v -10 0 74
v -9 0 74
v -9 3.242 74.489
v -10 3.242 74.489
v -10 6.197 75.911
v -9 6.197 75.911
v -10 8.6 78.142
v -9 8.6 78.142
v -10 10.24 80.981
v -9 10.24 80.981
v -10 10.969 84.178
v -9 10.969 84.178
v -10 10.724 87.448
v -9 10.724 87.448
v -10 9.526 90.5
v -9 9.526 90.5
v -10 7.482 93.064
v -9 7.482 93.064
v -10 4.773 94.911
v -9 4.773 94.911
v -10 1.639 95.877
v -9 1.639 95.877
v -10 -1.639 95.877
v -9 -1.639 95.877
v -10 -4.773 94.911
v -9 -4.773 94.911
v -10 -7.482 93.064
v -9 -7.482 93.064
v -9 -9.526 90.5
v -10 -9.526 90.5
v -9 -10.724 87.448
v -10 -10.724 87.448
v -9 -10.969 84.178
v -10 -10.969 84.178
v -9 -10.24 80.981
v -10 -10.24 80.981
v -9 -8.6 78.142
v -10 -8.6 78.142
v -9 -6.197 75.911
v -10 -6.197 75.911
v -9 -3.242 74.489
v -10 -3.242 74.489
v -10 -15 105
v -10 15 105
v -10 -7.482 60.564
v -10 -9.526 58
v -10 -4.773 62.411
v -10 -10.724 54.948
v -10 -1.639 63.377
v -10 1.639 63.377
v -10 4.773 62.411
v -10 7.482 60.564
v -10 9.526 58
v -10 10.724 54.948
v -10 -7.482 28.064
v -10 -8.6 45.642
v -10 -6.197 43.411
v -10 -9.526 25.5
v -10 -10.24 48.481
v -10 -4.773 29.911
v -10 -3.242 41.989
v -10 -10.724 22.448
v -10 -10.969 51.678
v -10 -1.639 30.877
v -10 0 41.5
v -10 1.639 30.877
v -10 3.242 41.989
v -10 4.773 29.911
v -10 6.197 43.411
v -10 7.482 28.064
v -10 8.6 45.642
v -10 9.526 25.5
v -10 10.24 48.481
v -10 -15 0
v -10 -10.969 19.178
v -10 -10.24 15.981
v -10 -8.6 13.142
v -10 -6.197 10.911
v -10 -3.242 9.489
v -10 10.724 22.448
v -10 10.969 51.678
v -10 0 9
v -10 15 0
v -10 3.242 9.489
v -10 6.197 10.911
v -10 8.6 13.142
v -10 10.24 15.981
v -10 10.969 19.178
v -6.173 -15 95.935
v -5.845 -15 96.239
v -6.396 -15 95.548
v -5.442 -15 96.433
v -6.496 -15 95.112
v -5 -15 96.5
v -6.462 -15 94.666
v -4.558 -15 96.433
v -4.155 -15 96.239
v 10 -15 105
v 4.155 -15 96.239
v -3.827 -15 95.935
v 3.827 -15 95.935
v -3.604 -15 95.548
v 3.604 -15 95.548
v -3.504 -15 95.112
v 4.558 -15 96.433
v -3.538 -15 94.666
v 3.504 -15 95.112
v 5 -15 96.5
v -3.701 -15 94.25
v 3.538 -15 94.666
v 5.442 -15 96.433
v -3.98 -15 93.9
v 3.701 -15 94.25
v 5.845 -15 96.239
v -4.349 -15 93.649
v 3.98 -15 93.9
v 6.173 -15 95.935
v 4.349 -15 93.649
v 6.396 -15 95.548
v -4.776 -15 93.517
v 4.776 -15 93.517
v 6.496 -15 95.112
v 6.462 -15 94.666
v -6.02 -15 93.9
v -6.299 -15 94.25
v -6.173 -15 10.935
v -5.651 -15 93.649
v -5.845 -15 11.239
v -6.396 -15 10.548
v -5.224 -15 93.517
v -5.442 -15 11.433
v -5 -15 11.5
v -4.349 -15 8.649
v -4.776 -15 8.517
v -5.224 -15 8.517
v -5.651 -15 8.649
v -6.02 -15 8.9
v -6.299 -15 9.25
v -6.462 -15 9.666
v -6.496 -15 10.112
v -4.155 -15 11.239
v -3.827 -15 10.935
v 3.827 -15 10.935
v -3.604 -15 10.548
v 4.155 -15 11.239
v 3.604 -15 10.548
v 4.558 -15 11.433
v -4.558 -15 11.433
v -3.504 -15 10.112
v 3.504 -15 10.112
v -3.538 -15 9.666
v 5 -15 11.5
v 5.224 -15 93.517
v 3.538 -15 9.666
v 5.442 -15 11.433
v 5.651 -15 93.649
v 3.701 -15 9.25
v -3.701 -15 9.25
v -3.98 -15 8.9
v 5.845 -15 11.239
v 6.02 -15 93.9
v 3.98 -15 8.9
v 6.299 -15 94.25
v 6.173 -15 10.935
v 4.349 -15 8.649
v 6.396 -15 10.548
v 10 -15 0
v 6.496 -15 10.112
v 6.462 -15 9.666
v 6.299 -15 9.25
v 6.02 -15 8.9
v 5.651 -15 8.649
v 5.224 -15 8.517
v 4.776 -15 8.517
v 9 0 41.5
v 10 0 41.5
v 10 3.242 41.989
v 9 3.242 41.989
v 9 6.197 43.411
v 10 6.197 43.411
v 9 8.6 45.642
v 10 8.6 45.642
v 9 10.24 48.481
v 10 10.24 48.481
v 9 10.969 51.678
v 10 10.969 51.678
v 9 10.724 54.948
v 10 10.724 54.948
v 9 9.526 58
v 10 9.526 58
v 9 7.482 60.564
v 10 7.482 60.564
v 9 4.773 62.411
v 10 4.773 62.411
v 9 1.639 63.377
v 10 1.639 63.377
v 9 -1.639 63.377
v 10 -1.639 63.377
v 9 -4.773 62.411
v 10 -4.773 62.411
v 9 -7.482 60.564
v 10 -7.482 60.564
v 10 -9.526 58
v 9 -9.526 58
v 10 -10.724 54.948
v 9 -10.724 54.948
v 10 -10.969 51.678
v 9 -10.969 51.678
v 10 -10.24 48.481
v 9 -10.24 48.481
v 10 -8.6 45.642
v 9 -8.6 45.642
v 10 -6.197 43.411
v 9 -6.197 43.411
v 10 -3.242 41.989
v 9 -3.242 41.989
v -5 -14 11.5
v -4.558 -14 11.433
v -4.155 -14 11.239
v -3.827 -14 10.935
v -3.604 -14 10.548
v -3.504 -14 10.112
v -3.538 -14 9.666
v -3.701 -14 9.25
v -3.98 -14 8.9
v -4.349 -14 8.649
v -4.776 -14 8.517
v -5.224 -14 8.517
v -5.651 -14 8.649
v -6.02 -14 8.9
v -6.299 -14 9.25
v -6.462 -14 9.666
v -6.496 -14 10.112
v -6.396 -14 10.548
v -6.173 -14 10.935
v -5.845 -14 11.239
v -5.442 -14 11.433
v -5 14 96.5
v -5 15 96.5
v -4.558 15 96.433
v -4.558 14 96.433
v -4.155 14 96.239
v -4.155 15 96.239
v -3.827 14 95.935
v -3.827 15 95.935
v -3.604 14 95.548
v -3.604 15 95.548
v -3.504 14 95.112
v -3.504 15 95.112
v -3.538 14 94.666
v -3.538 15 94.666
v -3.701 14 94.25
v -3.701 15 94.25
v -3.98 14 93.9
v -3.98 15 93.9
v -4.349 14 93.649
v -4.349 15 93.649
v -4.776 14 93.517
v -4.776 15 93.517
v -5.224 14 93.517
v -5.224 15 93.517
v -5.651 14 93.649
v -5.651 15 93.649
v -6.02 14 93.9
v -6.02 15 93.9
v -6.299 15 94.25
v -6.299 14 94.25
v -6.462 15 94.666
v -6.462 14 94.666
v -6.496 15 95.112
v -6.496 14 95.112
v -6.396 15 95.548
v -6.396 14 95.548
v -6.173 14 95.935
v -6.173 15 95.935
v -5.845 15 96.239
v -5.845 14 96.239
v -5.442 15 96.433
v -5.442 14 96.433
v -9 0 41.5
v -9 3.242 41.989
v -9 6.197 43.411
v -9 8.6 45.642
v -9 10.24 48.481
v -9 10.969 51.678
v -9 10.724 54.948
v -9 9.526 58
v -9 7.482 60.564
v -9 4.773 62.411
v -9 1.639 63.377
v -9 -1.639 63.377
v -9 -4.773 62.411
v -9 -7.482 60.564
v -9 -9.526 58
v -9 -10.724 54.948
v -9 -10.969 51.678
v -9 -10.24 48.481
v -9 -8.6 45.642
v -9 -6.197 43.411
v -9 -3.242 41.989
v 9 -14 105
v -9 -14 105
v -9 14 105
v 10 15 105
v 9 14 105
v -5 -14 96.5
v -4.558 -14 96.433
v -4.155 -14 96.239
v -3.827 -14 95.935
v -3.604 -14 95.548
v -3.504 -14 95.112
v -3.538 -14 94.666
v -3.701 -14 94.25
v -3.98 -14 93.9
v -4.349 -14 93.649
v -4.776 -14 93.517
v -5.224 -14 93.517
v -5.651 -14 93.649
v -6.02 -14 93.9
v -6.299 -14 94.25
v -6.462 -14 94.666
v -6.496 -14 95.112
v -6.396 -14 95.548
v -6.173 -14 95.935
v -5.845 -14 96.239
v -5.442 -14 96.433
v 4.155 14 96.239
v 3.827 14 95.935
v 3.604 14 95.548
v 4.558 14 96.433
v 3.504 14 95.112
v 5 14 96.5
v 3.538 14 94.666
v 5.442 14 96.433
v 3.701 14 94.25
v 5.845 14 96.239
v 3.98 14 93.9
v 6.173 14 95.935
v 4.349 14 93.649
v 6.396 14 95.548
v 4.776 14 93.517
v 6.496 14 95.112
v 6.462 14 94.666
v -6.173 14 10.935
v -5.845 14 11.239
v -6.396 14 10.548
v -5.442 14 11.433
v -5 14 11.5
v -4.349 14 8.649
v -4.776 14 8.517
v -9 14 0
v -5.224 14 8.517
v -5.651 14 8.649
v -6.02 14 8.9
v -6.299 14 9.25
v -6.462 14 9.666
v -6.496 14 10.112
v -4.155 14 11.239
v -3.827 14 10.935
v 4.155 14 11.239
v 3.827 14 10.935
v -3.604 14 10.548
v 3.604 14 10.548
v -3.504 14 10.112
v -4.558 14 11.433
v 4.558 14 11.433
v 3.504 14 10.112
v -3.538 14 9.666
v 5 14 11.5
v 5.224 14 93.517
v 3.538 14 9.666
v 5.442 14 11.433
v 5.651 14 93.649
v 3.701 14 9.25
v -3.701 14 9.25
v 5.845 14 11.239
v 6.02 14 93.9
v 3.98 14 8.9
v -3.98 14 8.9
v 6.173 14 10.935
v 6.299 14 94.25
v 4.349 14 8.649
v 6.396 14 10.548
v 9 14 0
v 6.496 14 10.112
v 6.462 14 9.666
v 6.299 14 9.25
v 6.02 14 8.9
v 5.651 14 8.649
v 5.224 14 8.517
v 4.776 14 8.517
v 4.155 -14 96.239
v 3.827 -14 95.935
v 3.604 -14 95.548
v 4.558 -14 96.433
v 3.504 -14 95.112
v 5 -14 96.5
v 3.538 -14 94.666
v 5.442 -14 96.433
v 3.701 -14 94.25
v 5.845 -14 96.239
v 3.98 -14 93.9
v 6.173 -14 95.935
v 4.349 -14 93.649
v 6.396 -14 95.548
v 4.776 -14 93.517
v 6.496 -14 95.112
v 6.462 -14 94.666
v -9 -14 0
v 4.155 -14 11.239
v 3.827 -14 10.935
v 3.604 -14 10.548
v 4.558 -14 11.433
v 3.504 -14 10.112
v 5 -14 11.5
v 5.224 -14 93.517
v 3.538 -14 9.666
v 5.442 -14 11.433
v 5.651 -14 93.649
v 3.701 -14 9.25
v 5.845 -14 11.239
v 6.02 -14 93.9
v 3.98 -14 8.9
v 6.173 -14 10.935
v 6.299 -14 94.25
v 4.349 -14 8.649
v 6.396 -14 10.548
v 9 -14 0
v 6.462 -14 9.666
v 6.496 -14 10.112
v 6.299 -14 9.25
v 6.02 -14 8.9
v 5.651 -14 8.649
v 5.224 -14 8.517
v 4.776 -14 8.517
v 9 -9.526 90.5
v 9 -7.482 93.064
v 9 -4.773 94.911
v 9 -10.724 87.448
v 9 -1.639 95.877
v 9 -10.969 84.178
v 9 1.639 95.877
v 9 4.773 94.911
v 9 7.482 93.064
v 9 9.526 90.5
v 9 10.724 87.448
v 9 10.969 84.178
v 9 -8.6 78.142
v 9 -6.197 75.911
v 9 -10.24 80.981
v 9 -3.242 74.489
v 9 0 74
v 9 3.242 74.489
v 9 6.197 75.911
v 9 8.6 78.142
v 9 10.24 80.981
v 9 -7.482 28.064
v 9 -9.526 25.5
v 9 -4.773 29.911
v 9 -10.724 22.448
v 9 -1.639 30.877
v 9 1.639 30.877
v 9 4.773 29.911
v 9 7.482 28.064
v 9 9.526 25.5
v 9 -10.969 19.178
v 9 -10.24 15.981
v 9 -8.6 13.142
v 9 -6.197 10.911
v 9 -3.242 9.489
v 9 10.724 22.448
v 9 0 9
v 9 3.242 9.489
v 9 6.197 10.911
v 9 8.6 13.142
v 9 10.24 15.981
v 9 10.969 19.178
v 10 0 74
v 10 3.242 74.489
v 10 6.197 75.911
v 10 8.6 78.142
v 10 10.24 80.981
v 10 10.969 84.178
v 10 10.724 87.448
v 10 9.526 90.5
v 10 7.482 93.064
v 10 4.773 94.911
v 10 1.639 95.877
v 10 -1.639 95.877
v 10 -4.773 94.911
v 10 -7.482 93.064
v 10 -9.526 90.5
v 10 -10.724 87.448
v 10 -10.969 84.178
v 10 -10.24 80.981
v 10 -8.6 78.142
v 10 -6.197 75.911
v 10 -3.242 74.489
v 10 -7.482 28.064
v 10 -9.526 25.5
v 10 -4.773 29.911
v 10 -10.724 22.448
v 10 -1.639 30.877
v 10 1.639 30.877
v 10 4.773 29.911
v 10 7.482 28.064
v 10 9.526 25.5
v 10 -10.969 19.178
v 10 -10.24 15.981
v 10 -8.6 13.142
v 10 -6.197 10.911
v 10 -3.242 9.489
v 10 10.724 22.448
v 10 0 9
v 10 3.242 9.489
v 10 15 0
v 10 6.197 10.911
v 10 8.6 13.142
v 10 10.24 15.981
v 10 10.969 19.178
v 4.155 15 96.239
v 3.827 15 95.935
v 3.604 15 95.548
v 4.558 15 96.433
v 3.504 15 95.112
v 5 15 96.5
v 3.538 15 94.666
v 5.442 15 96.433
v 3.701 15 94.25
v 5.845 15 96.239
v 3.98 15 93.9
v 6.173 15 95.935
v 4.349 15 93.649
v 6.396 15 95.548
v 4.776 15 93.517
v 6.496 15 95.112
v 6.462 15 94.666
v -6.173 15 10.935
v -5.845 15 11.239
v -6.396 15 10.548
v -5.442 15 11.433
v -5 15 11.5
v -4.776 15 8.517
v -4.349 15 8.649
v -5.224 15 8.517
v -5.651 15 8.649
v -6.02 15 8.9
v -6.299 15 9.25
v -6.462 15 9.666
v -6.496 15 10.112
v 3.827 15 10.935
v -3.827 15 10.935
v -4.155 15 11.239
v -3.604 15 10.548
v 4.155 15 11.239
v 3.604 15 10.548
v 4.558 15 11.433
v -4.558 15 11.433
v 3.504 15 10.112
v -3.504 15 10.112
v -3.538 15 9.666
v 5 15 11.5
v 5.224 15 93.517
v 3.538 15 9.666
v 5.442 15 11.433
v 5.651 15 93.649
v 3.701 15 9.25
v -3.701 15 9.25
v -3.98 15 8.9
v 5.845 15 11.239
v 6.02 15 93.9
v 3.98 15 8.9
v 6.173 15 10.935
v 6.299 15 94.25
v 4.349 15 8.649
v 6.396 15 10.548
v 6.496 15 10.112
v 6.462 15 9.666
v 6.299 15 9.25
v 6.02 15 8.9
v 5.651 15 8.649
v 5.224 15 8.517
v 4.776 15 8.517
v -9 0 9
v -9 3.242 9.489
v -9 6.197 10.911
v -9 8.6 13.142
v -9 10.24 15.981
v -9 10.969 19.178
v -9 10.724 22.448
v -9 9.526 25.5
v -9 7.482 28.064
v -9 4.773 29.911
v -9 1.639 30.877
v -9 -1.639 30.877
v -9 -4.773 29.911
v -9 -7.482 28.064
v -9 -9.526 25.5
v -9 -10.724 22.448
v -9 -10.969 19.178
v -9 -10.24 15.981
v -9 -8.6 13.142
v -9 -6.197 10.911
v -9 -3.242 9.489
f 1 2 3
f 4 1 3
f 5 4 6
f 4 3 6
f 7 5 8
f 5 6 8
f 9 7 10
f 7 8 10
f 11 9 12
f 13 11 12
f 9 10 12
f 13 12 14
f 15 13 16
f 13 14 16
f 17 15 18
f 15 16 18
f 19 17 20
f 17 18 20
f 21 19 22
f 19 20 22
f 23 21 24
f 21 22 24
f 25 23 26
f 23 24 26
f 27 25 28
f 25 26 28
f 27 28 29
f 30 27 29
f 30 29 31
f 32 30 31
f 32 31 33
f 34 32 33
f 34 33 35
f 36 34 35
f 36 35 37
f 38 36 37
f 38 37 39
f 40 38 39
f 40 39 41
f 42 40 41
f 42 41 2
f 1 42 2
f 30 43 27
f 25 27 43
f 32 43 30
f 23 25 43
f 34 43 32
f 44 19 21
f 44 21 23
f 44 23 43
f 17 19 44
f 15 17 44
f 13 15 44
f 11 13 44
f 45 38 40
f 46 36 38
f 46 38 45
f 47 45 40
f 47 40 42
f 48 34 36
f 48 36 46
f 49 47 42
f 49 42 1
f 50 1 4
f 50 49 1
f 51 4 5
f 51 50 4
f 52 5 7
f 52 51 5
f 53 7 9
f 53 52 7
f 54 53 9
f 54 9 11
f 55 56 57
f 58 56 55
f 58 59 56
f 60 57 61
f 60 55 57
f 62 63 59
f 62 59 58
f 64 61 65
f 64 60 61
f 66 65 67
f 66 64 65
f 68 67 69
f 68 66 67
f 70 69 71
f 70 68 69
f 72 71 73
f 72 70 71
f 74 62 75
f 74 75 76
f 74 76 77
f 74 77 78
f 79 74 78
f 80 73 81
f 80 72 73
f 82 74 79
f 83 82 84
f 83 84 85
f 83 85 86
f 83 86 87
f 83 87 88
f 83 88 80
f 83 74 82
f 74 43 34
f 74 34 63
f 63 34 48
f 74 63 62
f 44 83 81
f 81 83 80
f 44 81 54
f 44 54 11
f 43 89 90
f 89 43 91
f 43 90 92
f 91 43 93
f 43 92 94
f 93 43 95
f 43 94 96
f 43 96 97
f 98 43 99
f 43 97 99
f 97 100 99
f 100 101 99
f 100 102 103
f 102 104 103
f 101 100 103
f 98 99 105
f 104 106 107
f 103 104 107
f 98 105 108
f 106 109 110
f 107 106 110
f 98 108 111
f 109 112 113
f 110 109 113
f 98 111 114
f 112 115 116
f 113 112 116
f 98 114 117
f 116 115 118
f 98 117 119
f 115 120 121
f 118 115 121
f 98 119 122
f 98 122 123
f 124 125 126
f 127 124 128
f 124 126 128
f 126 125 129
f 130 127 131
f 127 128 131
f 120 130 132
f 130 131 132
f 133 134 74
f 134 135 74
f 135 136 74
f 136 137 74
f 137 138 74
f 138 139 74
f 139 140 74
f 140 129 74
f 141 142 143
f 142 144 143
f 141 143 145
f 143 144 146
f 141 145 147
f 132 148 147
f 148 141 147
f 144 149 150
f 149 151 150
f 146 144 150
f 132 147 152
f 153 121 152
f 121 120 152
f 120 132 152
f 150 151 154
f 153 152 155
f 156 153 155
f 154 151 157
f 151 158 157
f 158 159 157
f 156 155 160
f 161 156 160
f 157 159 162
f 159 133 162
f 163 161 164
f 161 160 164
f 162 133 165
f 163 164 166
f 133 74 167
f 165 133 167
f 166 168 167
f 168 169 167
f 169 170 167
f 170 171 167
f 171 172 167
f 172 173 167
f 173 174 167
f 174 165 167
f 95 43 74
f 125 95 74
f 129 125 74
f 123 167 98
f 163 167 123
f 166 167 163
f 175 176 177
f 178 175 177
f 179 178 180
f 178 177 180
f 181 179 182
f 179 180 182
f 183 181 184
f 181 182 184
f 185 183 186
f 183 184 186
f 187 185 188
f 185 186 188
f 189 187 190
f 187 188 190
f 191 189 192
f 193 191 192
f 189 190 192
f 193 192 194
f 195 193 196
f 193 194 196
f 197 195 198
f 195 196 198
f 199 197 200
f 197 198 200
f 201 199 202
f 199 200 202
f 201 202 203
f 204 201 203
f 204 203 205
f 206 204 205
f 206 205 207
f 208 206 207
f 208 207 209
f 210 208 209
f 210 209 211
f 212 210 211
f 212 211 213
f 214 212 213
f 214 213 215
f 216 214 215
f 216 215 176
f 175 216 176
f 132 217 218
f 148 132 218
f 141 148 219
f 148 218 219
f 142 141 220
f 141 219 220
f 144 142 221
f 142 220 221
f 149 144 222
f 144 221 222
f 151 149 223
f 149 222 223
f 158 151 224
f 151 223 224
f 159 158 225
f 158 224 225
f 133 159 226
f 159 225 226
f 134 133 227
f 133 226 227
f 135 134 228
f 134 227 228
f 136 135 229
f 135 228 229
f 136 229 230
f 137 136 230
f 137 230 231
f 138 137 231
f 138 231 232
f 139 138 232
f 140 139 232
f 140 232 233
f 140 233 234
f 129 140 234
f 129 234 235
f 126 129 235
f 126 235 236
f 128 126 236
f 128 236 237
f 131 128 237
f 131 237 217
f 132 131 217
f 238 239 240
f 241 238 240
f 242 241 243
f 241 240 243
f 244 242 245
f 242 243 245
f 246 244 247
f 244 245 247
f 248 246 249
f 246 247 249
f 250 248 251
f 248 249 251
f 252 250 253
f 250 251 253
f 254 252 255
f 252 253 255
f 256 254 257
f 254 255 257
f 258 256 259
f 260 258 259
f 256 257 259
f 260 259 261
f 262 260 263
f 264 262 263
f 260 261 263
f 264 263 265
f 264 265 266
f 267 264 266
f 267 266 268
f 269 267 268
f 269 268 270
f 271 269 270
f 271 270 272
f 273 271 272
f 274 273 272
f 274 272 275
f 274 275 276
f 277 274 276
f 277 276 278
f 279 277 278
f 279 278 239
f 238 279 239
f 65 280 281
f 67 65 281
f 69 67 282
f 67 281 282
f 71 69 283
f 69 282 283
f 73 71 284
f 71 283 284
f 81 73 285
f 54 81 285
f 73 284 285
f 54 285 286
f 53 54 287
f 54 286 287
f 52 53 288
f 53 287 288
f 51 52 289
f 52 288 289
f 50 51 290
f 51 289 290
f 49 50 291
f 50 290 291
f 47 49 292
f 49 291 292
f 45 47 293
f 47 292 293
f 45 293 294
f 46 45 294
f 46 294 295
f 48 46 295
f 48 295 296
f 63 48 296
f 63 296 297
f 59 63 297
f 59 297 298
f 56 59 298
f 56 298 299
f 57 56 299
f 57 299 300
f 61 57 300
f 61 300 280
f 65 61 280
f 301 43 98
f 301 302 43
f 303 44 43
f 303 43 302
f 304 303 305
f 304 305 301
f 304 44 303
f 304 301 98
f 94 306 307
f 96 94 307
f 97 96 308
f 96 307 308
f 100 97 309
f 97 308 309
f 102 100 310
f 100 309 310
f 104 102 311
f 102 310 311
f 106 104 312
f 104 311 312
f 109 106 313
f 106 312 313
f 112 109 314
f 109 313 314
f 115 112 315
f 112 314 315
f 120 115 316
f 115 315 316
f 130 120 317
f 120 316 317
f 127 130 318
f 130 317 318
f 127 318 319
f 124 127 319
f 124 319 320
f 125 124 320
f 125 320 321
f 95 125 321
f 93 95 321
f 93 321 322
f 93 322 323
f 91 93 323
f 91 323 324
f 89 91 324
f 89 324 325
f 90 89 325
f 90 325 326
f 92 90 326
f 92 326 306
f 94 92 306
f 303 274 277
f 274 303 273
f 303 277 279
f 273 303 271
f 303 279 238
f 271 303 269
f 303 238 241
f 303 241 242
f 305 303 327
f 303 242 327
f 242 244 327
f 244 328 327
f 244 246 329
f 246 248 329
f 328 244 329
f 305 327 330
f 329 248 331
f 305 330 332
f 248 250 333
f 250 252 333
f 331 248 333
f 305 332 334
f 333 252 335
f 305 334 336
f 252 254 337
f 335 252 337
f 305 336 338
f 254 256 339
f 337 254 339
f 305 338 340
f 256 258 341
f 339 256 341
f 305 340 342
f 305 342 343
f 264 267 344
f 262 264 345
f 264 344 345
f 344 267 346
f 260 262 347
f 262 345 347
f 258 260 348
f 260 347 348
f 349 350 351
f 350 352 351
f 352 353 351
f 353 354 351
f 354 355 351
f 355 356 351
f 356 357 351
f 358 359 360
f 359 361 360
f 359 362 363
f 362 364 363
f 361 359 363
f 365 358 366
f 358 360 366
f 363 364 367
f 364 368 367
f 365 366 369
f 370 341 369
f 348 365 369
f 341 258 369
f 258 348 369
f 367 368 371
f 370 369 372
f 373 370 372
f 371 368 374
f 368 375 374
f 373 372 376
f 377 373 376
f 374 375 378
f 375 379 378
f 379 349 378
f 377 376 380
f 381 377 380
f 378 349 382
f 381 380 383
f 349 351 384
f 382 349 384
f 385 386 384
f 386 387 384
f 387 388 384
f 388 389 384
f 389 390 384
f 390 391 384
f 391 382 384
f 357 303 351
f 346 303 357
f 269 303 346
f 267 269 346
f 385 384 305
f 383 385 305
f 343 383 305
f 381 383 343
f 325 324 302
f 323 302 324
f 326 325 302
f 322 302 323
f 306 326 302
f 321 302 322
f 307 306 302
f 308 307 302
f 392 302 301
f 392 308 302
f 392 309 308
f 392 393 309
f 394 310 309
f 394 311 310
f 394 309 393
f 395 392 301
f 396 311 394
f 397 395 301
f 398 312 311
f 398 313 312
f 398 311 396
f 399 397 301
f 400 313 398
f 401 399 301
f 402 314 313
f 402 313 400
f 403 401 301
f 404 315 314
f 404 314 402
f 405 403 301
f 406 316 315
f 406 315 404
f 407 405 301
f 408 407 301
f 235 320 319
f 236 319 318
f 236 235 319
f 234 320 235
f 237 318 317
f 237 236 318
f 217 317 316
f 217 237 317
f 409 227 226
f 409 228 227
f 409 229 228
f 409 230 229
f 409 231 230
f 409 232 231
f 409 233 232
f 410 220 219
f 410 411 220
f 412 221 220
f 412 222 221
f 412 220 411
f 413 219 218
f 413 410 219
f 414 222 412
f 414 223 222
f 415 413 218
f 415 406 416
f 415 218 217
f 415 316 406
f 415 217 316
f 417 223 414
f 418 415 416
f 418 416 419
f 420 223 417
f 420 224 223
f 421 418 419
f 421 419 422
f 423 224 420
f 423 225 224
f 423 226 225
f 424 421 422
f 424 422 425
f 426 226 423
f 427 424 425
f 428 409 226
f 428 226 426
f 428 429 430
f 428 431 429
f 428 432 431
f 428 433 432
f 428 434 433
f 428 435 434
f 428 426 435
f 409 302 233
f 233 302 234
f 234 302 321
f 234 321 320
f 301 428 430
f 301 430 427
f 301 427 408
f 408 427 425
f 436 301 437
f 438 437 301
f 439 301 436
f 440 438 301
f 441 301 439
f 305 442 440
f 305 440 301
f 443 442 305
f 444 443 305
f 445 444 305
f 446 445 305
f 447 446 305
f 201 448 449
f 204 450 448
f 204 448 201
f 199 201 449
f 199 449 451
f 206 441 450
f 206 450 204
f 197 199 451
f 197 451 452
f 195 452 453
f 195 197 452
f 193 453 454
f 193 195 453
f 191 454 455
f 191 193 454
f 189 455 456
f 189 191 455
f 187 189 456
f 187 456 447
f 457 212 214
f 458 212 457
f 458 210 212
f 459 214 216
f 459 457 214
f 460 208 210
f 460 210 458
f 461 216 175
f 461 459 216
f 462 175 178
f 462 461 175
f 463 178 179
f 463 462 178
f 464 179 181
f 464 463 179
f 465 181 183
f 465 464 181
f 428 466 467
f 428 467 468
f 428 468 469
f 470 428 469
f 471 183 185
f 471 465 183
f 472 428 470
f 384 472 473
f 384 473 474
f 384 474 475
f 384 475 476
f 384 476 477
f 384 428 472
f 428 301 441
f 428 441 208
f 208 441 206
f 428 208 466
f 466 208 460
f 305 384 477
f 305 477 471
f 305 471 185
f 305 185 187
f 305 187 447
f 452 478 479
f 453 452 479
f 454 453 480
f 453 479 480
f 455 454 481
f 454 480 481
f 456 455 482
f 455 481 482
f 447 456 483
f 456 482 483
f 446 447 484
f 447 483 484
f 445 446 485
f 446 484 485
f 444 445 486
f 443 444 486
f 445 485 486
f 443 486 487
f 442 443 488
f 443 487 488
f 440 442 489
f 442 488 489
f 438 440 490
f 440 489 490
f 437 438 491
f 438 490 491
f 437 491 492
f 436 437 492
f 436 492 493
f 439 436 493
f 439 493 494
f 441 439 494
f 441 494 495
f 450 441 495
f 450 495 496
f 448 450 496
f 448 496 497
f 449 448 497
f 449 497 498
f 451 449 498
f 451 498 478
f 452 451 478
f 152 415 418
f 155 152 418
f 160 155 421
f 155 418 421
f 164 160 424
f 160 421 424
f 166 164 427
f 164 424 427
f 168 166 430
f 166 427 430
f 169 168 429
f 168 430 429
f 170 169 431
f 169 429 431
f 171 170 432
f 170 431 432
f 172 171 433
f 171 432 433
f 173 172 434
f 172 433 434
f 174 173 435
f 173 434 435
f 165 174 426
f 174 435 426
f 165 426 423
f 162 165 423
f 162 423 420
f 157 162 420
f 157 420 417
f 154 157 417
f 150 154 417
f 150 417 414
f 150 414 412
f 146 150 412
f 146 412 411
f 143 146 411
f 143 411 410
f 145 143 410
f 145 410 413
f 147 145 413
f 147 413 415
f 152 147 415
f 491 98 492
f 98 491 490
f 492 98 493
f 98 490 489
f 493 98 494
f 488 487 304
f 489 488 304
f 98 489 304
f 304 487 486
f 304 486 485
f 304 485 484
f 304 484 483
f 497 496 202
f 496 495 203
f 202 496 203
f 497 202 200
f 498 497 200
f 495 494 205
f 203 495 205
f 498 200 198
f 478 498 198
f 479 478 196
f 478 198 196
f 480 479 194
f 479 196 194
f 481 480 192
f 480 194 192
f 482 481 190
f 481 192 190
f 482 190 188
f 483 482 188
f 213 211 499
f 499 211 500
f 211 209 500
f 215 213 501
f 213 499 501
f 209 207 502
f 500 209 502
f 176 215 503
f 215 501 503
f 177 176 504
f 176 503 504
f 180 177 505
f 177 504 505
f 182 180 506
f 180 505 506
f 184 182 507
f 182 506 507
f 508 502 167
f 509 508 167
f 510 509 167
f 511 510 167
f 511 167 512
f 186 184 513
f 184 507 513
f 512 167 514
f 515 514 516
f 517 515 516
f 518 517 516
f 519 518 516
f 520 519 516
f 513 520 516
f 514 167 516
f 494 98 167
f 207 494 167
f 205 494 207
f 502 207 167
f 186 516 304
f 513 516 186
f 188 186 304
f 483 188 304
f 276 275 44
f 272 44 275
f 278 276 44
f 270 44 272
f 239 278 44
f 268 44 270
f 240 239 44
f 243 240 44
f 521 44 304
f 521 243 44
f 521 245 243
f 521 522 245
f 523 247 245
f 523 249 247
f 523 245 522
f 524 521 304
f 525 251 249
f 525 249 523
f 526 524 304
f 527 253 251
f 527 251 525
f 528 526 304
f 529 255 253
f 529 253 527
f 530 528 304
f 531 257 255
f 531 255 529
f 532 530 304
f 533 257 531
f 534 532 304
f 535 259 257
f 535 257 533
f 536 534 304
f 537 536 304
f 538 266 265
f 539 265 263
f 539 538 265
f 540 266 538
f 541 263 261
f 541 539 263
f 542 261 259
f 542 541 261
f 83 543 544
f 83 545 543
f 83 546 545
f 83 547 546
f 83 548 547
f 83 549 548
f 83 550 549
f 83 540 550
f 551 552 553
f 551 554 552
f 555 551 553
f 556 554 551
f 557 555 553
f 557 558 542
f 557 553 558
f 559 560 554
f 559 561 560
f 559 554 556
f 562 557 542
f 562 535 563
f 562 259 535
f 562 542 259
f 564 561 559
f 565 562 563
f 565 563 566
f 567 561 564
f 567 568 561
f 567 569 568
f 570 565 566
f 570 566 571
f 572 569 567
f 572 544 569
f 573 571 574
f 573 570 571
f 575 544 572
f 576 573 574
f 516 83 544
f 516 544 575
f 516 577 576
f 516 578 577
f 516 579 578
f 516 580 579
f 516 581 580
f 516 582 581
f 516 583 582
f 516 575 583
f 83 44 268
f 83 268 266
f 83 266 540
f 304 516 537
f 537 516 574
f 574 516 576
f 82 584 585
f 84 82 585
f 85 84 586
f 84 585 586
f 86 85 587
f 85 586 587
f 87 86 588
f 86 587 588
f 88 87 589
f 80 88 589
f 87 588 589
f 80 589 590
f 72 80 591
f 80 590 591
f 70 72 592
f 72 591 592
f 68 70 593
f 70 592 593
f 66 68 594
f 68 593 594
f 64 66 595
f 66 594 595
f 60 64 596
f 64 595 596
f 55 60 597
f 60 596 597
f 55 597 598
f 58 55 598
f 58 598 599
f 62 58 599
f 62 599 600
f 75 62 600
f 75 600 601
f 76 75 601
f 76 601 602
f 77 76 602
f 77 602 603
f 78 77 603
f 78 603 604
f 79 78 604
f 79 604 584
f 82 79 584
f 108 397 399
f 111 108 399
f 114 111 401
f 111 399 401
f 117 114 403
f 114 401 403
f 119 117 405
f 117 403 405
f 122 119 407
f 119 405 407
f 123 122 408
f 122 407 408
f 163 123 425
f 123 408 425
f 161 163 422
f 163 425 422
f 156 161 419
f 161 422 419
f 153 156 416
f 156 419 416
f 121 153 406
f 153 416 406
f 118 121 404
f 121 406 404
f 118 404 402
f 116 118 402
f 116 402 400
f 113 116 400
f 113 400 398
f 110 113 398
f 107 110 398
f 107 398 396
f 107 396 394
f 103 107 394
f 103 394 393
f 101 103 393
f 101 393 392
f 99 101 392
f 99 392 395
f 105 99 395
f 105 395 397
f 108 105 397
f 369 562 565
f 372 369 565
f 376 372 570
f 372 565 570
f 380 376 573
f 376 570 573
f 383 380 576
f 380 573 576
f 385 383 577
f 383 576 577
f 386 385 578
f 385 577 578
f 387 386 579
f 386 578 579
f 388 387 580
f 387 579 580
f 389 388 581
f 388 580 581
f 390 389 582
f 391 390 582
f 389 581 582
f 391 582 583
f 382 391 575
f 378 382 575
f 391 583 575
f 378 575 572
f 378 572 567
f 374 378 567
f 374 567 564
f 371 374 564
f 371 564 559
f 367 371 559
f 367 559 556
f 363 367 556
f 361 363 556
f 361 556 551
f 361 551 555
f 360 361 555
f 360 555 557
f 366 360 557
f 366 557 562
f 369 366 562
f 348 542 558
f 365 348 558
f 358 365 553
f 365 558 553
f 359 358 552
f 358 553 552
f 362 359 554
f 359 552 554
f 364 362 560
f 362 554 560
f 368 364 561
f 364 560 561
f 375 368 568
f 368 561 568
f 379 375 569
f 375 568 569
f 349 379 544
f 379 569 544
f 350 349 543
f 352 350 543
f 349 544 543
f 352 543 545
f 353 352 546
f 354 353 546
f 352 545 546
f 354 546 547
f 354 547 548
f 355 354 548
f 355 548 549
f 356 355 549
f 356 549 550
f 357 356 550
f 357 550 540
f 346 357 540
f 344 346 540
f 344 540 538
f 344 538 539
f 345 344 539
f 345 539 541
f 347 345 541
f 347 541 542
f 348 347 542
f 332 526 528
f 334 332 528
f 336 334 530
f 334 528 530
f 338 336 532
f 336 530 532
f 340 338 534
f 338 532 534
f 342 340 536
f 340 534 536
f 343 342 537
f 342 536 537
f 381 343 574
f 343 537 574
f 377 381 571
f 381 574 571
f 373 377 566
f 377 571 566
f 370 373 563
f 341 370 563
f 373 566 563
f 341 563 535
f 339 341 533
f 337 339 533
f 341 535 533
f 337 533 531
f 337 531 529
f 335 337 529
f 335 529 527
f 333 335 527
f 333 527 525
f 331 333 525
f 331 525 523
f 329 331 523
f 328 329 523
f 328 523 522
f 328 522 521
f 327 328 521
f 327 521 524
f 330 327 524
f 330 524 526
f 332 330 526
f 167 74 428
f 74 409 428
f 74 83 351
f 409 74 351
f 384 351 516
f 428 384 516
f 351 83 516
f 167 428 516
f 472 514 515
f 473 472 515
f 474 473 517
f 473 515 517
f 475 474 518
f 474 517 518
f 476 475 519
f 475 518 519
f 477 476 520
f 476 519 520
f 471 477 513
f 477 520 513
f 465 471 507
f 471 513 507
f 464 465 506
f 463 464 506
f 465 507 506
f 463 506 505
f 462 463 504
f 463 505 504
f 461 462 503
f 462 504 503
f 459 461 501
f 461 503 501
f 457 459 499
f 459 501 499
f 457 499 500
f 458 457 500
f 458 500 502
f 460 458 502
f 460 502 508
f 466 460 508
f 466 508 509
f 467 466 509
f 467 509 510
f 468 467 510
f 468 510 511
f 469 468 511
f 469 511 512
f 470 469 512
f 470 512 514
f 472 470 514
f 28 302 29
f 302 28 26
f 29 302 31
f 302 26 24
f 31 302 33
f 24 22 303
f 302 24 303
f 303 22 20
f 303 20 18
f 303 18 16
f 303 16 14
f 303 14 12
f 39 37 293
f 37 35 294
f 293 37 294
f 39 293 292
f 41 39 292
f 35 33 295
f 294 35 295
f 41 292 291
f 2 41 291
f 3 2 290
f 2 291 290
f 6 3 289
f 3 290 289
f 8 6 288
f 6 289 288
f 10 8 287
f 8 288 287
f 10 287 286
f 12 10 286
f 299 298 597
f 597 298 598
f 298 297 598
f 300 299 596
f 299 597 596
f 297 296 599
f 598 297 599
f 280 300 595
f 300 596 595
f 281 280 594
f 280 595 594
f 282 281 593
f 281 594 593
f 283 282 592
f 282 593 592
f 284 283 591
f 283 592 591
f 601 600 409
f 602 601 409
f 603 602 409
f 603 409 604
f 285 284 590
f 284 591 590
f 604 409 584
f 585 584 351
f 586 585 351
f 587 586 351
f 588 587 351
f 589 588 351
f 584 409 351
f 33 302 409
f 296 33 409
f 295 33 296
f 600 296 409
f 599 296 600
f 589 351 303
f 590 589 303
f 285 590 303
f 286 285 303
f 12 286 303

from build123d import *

# Parameters (mm, degrees)
SKETCH_1_W          = 20
SKETCH_1_H          = 30
SKETCH_1_W_2        = 18
SKETCH_1_H_2        = 28
EXTRUDE_1_DEPTH     = 105
CUT_EXTRUDE_1_REACH = 111.659
SKETCH_2_R          = 1.5
CUT_EXTRUDE_3_REACH = 109.935
SKETCH_5_R          = 11


with BuildPart() as part:
    # 草图1 → 拉伸-薄壁1 (new body)
    with BuildSketch(Plane.XY):
        Rectangle(SKETCH_1_W, SKETCH_1_H)
        Rectangle(SKETCH_1_W_2, SKETCH_1_H_2, mode=Mode.SUBTRACT)
    extrude(amount=EXTRUDE_1_DEPTH)

    # 切除-拉伸1: up to this face of the body (flat: up to its plane)
    cut_extrude_1_end = Plane(part.part.faces().sort_by_distance((0, -15, 52.5))[0])
    # 草图2 → 切除-拉伸1 (cut, up to the picked face)
    with BuildSketch(Plane(origin=(0, 15, 0), x_dir=(1, 0, 0), z_dir=(0, 1, 0)), mode=Mode.PRIVATE) as cut_extrude_1_sk1:
        with Locations(Location((5, -10, 0), (0, 0, 270))):
            Circle(SKETCH_2_R)
    cut_extrude_1_tool1 = split(extrude(cut_extrude_1_sk1.sketch, amount=-CUT_EXTRUDE_1_REACH, mode=Mode.PRIVATE), bisect_by=cut_extrude_1_end, keep=Keep.BOTH, mode=Mode.PRIVATE)
    # 草图2 → 切除-拉伸1 (cut, up to the picked face)
    with BuildSketch(Plane(origin=(0, 15, 0), x_dir=(1, 0, 0), z_dir=(0, 1, 0)), mode=Mode.PRIVATE) as cut_extrude_1_sk2:
        with Locations(Location((-5, -10, 0), (0, 0, 270))):
            Circle(SKETCH_2_R)
    cut_extrude_1_tool2 = split(extrude(cut_extrude_1_sk2.sketch, amount=-CUT_EXTRUDE_1_REACH, mode=Mode.PRIVATE), bisect_by=cut_extrude_1_end, keep=Keep.BOTH, mode=Mode.PRIVATE)
    # 草图2 → 切除-拉伸1 (cut, up to the picked face)
    with BuildSketch(Plane(origin=(0, 15, 0), x_dir=(1, 0, 0), z_dir=(0, 1, 0)), mode=Mode.PRIVATE) as cut_extrude_1_sk3:
        with Locations(Location((5, -95, 0), (0, 0, 270))):
            Circle(SKETCH_2_R)
    cut_extrude_1_tool3 = split(extrude(cut_extrude_1_sk3.sketch, amount=-CUT_EXTRUDE_1_REACH, mode=Mode.PRIVATE), bisect_by=cut_extrude_1_end, keep=Keep.BOTH, mode=Mode.PRIVATE)
    # 草图2 → 切除-拉伸1 (cut, up to the picked face)
    with BuildSketch(Plane(origin=(0, 15, 0), x_dir=(1, 0, 0), z_dir=(0, 1, 0)), mode=Mode.PRIVATE) as cut_extrude_1_sk4:
        with Locations(Location((-5, -95, 0), (0, 0, 270))):
            Circle(SKETCH_2_R)
    cut_extrude_1_tool4 = split(extrude(cut_extrude_1_sk4.sketch, amount=-CUT_EXTRUDE_1_REACH, mode=Mode.PRIVATE), bisect_by=cut_extrude_1_end, keep=Keep.BOTH, mode=Mode.PRIVATE)
    add(cut_extrude_1_tool1.solids().sort_by(Axis((5, 15, 10), (0, -1, 0)))[0], mode=Mode.SUBTRACT)
    add(cut_extrude_1_tool2.solids().sort_by(Axis((-5, 15, 10), (0, -1, 0)))[0], mode=Mode.SUBTRACT)
    add(cut_extrude_1_tool3.solids().sort_by(Axis((5, 15, 95), (0, -1, 0)))[0], mode=Mode.SUBTRACT)
    add(cut_extrude_1_tool4.solids().sort_by(Axis((-5, 15, 95), (0, -1, 0)))[0], mode=Mode.SUBTRACT)

    # 切除-拉伸3: up to this face of the body (flat: up to its plane)
    cut_extrude_3_end = Plane(part.part.faces().sort_by_distance((-10, 0, 52.5))[0])
    # 草图5 → 切除-拉伸3 (cut, up to the picked face)
    with BuildSketch(Plane(origin=(10, 0, 0), x_dir=(0, 0, -1), z_dir=(1, 0, 0)), mode=Mode.PRIVATE) as cut_extrude_3_sk1:
        with Locations((-20, 0)):
            Circle(SKETCH_5_R)
    cut_extrude_3_tool1 = split(extrude(cut_extrude_3_sk1.sketch, amount=-CUT_EXTRUDE_3_REACH, mode=Mode.PRIVATE), bisect_by=cut_extrude_3_end, keep=Keep.BOTH, mode=Mode.PRIVATE)
    # 草图5 → 切除-拉伸3 (cut, up to the picked face)
    with BuildSketch(Plane(origin=(10, 0, 0), x_dir=(0, 0, -1), z_dir=(1, 0, 0)), mode=Mode.PRIVATE) as cut_extrude_3_sk2:
        with Locations((-52.5, 0)):
            Circle(SKETCH_5_R)
    cut_extrude_3_tool2 = split(extrude(cut_extrude_3_sk2.sketch, amount=-CUT_EXTRUDE_3_REACH, mode=Mode.PRIVATE), bisect_by=cut_extrude_3_end, keep=Keep.BOTH, mode=Mode.PRIVATE)
    # 草图5 → 切除-拉伸3 (cut, up to the picked face)
    with BuildSketch(Plane(origin=(10, 0, 0), x_dir=(0, 0, -1), z_dir=(1, 0, 0)), mode=Mode.PRIVATE) as cut_extrude_3_sk3:
        with Locations((-85, 0)):
            Circle(SKETCH_5_R)
    cut_extrude_3_tool3 = split(extrude(cut_extrude_3_sk3.sketch, amount=-CUT_EXTRUDE_3_REACH, mode=Mode.PRIVATE), bisect_by=cut_extrude_3_end, keep=Keep.BOTH, mode=Mode.PRIVATE)
    add(cut_extrude_3_tool1.solids().sort_by(Axis((10, 0, 20), (-1, 0, 0)))[0], mode=Mode.SUBTRACT)
    add(cut_extrude_3_tool2.solids().sort_by(Axis((10, 0, 52.5), (-1, 0, 0)))[0], mode=Mode.SUBTRACT)
    add(cut_extrude_3_tool3.solids().sort_by(Axis((10, 0, 85), (-1, 0, 0)))[0], mode=Mode.SUBTRACT)


solid = part.part
